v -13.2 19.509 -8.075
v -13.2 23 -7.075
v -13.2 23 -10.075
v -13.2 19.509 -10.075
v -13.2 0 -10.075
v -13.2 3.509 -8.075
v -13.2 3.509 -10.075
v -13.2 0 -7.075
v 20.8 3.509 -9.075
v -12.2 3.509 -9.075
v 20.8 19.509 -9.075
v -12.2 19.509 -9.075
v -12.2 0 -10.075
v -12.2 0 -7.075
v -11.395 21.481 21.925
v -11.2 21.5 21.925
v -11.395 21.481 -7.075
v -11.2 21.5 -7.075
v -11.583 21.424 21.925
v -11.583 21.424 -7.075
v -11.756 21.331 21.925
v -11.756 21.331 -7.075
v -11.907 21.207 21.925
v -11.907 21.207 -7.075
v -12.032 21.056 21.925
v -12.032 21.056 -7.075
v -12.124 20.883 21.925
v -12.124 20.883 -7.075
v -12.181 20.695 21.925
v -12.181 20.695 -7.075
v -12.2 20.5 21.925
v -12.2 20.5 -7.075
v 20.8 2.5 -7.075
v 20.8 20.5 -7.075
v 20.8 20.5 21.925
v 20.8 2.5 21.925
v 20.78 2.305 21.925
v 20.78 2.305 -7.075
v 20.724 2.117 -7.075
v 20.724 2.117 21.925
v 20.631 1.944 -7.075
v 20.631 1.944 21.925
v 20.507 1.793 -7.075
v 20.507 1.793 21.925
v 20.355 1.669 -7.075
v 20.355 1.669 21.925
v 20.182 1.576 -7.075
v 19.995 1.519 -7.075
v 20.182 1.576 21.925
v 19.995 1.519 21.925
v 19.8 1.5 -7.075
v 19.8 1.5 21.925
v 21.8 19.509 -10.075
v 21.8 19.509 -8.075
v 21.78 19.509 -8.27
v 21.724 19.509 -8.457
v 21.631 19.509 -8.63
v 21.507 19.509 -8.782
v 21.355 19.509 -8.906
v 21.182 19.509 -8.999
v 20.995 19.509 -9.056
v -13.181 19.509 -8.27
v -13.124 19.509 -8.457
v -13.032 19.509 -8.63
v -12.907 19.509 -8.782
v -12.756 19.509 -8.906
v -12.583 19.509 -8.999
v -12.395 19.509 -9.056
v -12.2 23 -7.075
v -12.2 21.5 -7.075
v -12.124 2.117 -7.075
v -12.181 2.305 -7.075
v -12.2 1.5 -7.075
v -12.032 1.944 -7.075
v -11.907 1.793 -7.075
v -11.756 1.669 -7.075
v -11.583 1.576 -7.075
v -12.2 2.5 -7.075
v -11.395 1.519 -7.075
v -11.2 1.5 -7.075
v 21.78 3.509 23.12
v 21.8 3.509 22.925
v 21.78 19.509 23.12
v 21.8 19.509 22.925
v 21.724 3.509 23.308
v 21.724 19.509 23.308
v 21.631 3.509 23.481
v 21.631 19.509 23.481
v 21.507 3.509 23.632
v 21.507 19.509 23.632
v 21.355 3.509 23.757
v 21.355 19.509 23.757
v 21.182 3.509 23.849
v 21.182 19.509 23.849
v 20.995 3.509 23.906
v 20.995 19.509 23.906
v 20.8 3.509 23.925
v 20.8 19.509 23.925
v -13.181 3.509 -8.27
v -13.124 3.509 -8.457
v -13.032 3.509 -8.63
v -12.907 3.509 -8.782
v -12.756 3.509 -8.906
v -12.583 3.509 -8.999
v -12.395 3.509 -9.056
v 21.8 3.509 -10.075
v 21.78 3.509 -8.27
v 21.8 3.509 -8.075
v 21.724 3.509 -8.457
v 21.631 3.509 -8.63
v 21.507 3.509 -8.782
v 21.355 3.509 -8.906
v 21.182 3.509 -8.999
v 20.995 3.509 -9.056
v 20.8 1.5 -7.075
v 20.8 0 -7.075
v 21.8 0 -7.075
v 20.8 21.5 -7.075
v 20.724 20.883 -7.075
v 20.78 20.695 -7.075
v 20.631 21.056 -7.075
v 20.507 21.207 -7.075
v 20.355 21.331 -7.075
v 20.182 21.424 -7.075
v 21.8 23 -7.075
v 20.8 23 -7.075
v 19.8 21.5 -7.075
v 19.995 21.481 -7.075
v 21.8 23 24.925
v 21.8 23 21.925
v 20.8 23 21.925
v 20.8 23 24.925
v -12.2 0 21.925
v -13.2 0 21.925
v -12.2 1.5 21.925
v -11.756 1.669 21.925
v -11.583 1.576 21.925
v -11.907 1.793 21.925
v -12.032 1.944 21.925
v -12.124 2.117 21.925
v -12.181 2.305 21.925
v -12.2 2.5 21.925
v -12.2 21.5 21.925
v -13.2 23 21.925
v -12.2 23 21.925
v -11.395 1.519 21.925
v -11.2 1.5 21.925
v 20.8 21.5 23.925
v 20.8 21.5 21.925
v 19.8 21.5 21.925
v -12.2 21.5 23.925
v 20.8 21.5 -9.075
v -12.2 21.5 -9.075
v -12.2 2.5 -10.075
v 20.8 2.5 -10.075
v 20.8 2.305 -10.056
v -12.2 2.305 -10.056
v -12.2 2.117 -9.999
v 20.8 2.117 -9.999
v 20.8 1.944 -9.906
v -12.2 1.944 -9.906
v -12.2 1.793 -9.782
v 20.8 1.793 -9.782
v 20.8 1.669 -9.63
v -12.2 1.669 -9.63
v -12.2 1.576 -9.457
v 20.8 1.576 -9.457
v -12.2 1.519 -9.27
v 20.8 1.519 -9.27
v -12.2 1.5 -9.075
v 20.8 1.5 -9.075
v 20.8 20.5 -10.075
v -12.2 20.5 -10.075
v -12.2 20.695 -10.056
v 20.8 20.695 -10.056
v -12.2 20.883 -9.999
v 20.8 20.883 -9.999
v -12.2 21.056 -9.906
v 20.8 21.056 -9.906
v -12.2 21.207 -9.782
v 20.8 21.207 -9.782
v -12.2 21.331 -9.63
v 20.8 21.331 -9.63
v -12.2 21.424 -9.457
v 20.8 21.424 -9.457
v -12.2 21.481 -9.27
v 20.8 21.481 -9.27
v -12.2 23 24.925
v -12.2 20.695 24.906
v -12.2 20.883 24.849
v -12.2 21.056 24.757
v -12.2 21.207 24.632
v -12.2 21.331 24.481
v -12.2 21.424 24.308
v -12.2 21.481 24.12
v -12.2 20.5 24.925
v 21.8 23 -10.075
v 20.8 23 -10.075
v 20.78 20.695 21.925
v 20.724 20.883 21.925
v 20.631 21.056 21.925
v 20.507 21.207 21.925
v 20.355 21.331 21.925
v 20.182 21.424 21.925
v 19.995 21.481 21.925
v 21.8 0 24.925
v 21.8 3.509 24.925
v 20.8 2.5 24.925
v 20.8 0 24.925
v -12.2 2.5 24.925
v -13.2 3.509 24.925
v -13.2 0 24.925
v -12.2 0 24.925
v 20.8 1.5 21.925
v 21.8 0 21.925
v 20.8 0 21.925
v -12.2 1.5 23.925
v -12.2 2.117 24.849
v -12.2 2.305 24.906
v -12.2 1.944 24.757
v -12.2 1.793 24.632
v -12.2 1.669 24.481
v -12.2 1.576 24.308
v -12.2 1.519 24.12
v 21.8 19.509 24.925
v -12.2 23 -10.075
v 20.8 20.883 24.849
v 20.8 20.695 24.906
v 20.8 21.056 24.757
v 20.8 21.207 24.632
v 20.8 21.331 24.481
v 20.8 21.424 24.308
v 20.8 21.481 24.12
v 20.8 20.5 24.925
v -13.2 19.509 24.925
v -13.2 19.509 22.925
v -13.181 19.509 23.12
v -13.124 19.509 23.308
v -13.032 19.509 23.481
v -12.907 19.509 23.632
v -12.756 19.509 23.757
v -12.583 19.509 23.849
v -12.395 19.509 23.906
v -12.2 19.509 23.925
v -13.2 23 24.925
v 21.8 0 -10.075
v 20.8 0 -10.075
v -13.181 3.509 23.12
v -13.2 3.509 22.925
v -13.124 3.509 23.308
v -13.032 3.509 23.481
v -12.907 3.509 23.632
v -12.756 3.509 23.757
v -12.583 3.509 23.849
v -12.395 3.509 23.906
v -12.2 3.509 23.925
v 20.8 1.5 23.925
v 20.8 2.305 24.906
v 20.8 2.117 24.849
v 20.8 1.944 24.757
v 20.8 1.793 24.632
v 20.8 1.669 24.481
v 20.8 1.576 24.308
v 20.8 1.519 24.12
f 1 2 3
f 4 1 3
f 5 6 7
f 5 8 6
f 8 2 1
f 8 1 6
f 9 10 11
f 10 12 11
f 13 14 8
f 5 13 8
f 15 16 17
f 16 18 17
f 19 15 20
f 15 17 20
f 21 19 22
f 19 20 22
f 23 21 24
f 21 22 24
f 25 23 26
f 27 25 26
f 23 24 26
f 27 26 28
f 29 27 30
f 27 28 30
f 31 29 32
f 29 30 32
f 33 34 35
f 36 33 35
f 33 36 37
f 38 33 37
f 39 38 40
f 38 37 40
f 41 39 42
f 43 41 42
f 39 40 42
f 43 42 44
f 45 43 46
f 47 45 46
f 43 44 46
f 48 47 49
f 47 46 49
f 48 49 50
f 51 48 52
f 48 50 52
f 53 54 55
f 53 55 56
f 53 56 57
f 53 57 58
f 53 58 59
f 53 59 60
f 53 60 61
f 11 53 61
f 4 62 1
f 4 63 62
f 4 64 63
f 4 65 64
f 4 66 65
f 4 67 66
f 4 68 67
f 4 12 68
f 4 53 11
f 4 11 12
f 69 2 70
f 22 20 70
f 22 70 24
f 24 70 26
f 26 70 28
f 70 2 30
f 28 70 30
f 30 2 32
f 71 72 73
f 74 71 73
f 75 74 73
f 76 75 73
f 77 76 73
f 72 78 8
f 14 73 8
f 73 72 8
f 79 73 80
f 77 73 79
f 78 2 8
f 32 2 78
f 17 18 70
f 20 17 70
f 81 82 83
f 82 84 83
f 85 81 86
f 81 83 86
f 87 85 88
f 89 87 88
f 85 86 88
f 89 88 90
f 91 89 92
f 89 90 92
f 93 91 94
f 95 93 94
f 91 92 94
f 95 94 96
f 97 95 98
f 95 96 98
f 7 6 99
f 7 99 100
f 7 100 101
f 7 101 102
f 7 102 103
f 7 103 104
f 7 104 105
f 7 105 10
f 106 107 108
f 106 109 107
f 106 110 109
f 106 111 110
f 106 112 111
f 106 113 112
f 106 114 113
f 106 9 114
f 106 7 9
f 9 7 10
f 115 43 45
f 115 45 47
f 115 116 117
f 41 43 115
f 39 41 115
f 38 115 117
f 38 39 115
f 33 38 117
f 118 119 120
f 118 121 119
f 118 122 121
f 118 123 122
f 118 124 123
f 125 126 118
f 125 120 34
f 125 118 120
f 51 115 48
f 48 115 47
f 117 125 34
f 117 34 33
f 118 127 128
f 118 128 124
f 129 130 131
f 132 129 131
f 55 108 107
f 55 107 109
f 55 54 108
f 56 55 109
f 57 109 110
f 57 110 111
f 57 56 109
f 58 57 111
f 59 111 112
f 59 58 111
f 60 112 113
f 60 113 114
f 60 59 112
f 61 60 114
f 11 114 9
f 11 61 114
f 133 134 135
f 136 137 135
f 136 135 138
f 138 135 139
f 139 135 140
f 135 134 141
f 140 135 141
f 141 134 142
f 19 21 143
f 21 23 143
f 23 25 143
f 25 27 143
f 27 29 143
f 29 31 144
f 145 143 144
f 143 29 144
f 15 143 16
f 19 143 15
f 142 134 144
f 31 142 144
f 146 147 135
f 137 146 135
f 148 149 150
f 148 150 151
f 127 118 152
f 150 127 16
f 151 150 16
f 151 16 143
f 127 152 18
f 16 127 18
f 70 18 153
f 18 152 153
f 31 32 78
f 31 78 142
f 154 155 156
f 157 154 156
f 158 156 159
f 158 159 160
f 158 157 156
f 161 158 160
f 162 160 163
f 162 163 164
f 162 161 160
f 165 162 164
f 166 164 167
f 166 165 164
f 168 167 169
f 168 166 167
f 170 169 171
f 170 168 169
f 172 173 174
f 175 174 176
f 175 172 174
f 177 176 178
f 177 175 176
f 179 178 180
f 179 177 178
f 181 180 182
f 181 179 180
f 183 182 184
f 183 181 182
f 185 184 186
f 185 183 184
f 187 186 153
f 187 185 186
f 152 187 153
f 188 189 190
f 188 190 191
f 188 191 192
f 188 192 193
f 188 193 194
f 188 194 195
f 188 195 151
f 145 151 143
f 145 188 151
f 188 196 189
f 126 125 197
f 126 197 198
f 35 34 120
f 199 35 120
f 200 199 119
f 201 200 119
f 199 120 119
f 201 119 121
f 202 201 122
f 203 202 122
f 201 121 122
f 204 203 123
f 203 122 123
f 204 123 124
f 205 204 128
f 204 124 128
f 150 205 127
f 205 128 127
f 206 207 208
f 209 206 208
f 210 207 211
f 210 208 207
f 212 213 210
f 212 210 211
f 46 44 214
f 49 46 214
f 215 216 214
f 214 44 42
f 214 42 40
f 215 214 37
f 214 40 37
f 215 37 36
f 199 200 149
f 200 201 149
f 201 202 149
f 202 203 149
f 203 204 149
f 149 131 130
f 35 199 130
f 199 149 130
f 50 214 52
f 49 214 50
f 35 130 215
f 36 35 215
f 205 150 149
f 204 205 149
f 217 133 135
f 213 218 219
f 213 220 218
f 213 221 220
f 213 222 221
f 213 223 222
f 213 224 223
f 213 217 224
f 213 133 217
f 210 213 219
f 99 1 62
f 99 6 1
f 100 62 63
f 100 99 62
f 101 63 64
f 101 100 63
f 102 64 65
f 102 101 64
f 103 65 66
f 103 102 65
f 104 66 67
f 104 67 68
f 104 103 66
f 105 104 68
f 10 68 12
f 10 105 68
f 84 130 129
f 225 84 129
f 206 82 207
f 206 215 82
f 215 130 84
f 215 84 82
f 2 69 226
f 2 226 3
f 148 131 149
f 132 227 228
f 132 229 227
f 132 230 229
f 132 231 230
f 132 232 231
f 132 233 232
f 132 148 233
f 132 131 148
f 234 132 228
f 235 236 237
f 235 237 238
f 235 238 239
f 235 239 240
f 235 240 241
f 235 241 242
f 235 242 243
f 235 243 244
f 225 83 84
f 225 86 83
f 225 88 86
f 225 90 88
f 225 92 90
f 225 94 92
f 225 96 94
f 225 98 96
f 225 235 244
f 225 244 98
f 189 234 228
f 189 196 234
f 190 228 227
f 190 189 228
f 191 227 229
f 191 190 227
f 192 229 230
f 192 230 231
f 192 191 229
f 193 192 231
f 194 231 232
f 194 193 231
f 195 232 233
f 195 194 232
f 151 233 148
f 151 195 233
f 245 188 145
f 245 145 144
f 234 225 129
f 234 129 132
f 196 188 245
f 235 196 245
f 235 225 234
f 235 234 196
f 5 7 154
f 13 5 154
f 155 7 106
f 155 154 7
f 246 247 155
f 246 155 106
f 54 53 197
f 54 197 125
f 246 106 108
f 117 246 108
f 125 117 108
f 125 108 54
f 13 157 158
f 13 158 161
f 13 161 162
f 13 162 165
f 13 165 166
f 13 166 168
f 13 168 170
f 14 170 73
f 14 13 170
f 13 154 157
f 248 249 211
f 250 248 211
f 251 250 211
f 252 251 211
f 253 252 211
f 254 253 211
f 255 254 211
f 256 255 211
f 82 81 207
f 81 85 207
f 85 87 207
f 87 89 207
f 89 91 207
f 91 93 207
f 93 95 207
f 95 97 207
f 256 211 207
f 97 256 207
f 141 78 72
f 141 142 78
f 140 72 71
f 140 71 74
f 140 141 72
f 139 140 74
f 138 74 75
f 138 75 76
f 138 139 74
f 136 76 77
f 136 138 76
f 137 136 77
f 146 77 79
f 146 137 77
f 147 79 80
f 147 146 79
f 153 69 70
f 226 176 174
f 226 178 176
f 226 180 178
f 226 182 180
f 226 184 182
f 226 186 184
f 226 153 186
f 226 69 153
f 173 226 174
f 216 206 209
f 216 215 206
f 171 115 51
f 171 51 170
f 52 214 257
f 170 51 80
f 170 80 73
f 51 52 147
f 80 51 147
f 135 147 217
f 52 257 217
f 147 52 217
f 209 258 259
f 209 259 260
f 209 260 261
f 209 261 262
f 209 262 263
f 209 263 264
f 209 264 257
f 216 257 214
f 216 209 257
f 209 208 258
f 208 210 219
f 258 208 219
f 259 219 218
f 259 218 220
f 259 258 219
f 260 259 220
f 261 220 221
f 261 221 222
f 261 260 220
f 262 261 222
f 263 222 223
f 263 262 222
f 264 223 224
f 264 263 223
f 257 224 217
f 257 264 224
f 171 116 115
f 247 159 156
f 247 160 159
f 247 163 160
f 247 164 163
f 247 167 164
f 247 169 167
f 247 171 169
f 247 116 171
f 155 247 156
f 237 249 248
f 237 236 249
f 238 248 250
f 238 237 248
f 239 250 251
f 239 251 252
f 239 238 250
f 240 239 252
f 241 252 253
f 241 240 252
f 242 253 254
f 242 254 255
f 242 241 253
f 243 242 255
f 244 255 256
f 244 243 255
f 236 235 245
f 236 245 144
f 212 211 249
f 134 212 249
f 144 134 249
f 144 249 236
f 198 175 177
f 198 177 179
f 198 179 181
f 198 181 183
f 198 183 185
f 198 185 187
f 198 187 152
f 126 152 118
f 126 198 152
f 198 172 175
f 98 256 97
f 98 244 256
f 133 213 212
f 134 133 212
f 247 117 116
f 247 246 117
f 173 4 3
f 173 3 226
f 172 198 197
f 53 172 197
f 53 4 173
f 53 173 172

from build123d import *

# Parameters (mm, degrees)
BOSS_EXTRUDE1_DEPTH = 23
CUT_EXTRUDE1_DEPTH  = 1.5
CUT_EXTRUDE2_DEPTH  = 1.5
FILLET2_R           = 1
FILLET3_R           = 1
FILLET4_R           = 1
FILLET5_R           = 1
CUT_EXTRUDE3_DEPTH  = 1
FILLET6_R           = 1
FILLET7_R           = 1
SKETCH6_W           = 35
SKETCH6_H           = 16.000000000000004
CUT_EXTRUDE4_DEPTH  = 1
FILLET8_R           = 1
FILLET9_R           = 1
CUT_EXTRUDE5_DEPTH  = 1
CUT_EXTRUDE6_DEPTH  = 1
FILLET10_R          = 1
FILLET11_R          = 1
FILLET12_R          = 1
FILLET13_R          = 1


with BuildPart() as part:
    # Sketch1 → Boss-Extrude1 (new body)
    with BuildSketch(Plane(origin=(0, 0, 0), x_dir=(1, 0, 0), z_dir=(0, 1, 0))):
        Polygon((-13.200362647325472, 10.07479601087942), (21.799637352674534, 10.07479601087942), (21.799637352674537, -24.925203989120583), (-13.200362647325466, -24.925203989120583), align=None)
    extrude(amount=BOSS_EXTRUDE1_DEPTH)

    # Sketch2 → Cut-Extrude1 (cut)
    with BuildSketch(Plane(origin=(0, 23, 0), x_dir=(1, 0, 0), z_dir=(0, 1, 0))):
        Polygon((20.79963735267453, -24.925203989120583), (-12.200362647325468, -24.925203989120586), (-12.20036264732547, 10.074796010879416), (20.79963735267453, 10.07479601087942), align=None)
    extrude(amount=-CUT_EXTRUDE1_DEPTH, mode=Mode.SUBTRACT)

    # Sketch3 → Cut-Extrude2 (cut)
    with BuildSketch(Plane.XZ):
        Polygon((20.799637352674537, -10.07479601087942), (-12.200362647325464, -10.074796010879423), (-12.200362647325463, 24.92520398912058), (20.799637352674537, 24.925203989120583), align=None)
    extrude(amount=-CUT_EXTRUDE2_DEPTH, mode=Mode.SUBTRACT)

    # Fillet2
    fillet2_edges = [part.edges().sort_by_distance(p)[0] for p in [
        (4.29963735267453, 21.5, -10.074796010879417),
    ]]
    fillet(fillet2_edges, radius=FILLET2_R)

    # Fillet3
    fillet3_edges = [part.edges().sort_by_distance(p)[0] for p in [
        (4.29963735267453, 21.5, 24.925203989120583),
    ]]
    fillet(fillet3_edges, radius=FILLET3_R)

    # Fillet4
    fillet4_edges = [part.edges().sort_by_distance(p)[0] for p in [
        (4.299637352674537, 1.5, 24.925203989120583),
    ]]
    fillet(fillet4_edges, radius=FILLET4_R)

    # Fillet5
    fillet5_edges = [part.edges().sort_by_distance(p)[0] for p in [
        (4.299637352674537, 1.5, -10.074796010879421),
    ]]
    fillet(fillet5_edges, radius=FILLET5_R)

    # Sketch5 → Cut-Extrude3 (cut)
    with BuildSketch(Plane(origin=(0, 0, -10.07479601087942), x_dir=(-1, 0, 0), z_dir=(0, 0, -1))):
        Polygon((13.200362647325472, 3.5089999999999977), (-21.799637352674534, 3.5089999999999937), (-21.799637352674534, 19.508999999999997), (13.200362647325472, 19.509), align=None)
    extrude(amount=-CUT_EXTRUDE3_DEPTH, mode=Mode.SUBTRACT)

    # Fillet6
    fillet6_edges = [part.edges().sort_by_distance(p)[0] for p in [
        (-13.200362647325472, 11.508999999999999, -9.07479601087942),
    ]]
    fillet(fillet6_edges, radius=FILLET6_R)

    # Fillet7
    fillet7_edges = [part.edges().sort_by_distance(p)[0] for p in [
        (21.799637352674534, 11.508999999999995, -9.07479601087942),
    ]]
    fillet(fillet7_edges, radius=FILLET7_R)

    # Sketch6 → Cut-Extrude4 (cut)
    with BuildSketch(Plane.XY.offset(24.925203989120583)):
        with Locations((4.299637352674536, 11.508999999999999)):
            Rectangle(SKETCH6_W, SKETCH6_H)
    extrude(amount=-CUT_EXTRUDE4_DEPTH, mode=Mode.SUBTRACT)

    # Fillet8
    fillet8_edges = [part.edges().sort_by_distance(p)[0] for p in [
        (-13.200362647325463, 11.509, 23.925203989120583),
    ]]
    fillet(fillet8_edges, radius=FILLET8_R)

    # Fillet9
    fillet9_edges = [part.edges().sort_by_distance(p)[0] for p in [
        (21.799637352674537, 11.508999999999999, 23.925203989120583),
    ]]
    fillet(fillet9_edges, radius=FILLET9_R)

    # Sketch7 → Cut-Extrude5 (cut)
    with BuildSketch(Plane(origin=(21.799637352674537, 0, -4.32e-15), x_dir=(-2e-16, 0, -1), z_dir=(1, 0, -2e-16))):
        Polygon((7.074796010879417, -1.2e-16), (-21.925203989120586, -3.95e-15), (-21.925203989120586, 22.999999999999996), (7.074796010879417, 22.999999999999996), align=None)
    extrude(amount=-CUT_EXTRUDE5_DEPTH, mode=Mode.SUBTRACT)

    # Sketch8 → Cut-Extrude6 (cut)
    with BuildSketch(Plane(origin=(-13.200362647325473, 0, -13.200362647325468), x_dir=(-1.5e-16, 0, -1), z_dir=(1, 0, -1.5e-16))):
        Polygon((-6.125566636446044, 8e-17), (-35.125566636446045, -3.47e-15), (-35.125566636446045, 22.999999999999996), (-6.1255666364460435, 23), align=None)
    extrude(amount=CUT_EXTRUDE6_DEPTH, mode=Mode.SUBTRACT)

    # Fillet10
    fillet10_edges = [part.edges().sort_by_distance(p)[0] for p in [
        (-12.20036264732547, 21.5, 7.425203989120572),
    ]]
    fillet(fillet10_edges, radius=FILLET10_R)

    # Fillet11
    fillet11_edges = [part.edges().sort_by_distance(p)[0] for p in [
        (-12.200362647325463, 1.5, 7.425203989120577),
    ]]
    fillet(fillet11_edges, radius=FILLET11_R)

    # Fillet12
    # the kernel refuses this fillet: 1 mm, written as the material it takes off along each edge
    with BuildSketch(Plane(origin=(20.79963735267453, 21.5, -7.074796010879421), x_dir=(-1, 0, 0), z_dir=(0, 0, 1))) as fillet12_piece_1:
        with BuildLine():
            CenterArc((FILLET12_R, FILLET12_R), FILLET12_R, 180, 90)
            Line((0, FILLET12_R), (0, 0))
            Line((0, 0), (FILLET12_R, 0))
        make_face()
    extrude(amount=29.000000000000004, mode=Mode.SUBTRACT)

    # Fillet13
    # the kernel refuses this fillet: 1 mm, written as the material it takes off along each edge
    with BuildSketch(Plane(origin=(20.799637352674537, 1.5, 21.925203989120583), x_dir=(-1, 0, 0), z_dir=(0, 0, -1))) as fillet13_piece_1:
        with BuildLine():
            CenterArc((FILLET13_R, FILLET13_R), FILLET13_R, 180, 90)
            Line((0, FILLET13_R), (0, 0))
            Line((0, 0), (FILLET13_R, 0))
        make_face()
    extrude(amount=29, mode=Mode.SUBTRACT)


solid = part.part
